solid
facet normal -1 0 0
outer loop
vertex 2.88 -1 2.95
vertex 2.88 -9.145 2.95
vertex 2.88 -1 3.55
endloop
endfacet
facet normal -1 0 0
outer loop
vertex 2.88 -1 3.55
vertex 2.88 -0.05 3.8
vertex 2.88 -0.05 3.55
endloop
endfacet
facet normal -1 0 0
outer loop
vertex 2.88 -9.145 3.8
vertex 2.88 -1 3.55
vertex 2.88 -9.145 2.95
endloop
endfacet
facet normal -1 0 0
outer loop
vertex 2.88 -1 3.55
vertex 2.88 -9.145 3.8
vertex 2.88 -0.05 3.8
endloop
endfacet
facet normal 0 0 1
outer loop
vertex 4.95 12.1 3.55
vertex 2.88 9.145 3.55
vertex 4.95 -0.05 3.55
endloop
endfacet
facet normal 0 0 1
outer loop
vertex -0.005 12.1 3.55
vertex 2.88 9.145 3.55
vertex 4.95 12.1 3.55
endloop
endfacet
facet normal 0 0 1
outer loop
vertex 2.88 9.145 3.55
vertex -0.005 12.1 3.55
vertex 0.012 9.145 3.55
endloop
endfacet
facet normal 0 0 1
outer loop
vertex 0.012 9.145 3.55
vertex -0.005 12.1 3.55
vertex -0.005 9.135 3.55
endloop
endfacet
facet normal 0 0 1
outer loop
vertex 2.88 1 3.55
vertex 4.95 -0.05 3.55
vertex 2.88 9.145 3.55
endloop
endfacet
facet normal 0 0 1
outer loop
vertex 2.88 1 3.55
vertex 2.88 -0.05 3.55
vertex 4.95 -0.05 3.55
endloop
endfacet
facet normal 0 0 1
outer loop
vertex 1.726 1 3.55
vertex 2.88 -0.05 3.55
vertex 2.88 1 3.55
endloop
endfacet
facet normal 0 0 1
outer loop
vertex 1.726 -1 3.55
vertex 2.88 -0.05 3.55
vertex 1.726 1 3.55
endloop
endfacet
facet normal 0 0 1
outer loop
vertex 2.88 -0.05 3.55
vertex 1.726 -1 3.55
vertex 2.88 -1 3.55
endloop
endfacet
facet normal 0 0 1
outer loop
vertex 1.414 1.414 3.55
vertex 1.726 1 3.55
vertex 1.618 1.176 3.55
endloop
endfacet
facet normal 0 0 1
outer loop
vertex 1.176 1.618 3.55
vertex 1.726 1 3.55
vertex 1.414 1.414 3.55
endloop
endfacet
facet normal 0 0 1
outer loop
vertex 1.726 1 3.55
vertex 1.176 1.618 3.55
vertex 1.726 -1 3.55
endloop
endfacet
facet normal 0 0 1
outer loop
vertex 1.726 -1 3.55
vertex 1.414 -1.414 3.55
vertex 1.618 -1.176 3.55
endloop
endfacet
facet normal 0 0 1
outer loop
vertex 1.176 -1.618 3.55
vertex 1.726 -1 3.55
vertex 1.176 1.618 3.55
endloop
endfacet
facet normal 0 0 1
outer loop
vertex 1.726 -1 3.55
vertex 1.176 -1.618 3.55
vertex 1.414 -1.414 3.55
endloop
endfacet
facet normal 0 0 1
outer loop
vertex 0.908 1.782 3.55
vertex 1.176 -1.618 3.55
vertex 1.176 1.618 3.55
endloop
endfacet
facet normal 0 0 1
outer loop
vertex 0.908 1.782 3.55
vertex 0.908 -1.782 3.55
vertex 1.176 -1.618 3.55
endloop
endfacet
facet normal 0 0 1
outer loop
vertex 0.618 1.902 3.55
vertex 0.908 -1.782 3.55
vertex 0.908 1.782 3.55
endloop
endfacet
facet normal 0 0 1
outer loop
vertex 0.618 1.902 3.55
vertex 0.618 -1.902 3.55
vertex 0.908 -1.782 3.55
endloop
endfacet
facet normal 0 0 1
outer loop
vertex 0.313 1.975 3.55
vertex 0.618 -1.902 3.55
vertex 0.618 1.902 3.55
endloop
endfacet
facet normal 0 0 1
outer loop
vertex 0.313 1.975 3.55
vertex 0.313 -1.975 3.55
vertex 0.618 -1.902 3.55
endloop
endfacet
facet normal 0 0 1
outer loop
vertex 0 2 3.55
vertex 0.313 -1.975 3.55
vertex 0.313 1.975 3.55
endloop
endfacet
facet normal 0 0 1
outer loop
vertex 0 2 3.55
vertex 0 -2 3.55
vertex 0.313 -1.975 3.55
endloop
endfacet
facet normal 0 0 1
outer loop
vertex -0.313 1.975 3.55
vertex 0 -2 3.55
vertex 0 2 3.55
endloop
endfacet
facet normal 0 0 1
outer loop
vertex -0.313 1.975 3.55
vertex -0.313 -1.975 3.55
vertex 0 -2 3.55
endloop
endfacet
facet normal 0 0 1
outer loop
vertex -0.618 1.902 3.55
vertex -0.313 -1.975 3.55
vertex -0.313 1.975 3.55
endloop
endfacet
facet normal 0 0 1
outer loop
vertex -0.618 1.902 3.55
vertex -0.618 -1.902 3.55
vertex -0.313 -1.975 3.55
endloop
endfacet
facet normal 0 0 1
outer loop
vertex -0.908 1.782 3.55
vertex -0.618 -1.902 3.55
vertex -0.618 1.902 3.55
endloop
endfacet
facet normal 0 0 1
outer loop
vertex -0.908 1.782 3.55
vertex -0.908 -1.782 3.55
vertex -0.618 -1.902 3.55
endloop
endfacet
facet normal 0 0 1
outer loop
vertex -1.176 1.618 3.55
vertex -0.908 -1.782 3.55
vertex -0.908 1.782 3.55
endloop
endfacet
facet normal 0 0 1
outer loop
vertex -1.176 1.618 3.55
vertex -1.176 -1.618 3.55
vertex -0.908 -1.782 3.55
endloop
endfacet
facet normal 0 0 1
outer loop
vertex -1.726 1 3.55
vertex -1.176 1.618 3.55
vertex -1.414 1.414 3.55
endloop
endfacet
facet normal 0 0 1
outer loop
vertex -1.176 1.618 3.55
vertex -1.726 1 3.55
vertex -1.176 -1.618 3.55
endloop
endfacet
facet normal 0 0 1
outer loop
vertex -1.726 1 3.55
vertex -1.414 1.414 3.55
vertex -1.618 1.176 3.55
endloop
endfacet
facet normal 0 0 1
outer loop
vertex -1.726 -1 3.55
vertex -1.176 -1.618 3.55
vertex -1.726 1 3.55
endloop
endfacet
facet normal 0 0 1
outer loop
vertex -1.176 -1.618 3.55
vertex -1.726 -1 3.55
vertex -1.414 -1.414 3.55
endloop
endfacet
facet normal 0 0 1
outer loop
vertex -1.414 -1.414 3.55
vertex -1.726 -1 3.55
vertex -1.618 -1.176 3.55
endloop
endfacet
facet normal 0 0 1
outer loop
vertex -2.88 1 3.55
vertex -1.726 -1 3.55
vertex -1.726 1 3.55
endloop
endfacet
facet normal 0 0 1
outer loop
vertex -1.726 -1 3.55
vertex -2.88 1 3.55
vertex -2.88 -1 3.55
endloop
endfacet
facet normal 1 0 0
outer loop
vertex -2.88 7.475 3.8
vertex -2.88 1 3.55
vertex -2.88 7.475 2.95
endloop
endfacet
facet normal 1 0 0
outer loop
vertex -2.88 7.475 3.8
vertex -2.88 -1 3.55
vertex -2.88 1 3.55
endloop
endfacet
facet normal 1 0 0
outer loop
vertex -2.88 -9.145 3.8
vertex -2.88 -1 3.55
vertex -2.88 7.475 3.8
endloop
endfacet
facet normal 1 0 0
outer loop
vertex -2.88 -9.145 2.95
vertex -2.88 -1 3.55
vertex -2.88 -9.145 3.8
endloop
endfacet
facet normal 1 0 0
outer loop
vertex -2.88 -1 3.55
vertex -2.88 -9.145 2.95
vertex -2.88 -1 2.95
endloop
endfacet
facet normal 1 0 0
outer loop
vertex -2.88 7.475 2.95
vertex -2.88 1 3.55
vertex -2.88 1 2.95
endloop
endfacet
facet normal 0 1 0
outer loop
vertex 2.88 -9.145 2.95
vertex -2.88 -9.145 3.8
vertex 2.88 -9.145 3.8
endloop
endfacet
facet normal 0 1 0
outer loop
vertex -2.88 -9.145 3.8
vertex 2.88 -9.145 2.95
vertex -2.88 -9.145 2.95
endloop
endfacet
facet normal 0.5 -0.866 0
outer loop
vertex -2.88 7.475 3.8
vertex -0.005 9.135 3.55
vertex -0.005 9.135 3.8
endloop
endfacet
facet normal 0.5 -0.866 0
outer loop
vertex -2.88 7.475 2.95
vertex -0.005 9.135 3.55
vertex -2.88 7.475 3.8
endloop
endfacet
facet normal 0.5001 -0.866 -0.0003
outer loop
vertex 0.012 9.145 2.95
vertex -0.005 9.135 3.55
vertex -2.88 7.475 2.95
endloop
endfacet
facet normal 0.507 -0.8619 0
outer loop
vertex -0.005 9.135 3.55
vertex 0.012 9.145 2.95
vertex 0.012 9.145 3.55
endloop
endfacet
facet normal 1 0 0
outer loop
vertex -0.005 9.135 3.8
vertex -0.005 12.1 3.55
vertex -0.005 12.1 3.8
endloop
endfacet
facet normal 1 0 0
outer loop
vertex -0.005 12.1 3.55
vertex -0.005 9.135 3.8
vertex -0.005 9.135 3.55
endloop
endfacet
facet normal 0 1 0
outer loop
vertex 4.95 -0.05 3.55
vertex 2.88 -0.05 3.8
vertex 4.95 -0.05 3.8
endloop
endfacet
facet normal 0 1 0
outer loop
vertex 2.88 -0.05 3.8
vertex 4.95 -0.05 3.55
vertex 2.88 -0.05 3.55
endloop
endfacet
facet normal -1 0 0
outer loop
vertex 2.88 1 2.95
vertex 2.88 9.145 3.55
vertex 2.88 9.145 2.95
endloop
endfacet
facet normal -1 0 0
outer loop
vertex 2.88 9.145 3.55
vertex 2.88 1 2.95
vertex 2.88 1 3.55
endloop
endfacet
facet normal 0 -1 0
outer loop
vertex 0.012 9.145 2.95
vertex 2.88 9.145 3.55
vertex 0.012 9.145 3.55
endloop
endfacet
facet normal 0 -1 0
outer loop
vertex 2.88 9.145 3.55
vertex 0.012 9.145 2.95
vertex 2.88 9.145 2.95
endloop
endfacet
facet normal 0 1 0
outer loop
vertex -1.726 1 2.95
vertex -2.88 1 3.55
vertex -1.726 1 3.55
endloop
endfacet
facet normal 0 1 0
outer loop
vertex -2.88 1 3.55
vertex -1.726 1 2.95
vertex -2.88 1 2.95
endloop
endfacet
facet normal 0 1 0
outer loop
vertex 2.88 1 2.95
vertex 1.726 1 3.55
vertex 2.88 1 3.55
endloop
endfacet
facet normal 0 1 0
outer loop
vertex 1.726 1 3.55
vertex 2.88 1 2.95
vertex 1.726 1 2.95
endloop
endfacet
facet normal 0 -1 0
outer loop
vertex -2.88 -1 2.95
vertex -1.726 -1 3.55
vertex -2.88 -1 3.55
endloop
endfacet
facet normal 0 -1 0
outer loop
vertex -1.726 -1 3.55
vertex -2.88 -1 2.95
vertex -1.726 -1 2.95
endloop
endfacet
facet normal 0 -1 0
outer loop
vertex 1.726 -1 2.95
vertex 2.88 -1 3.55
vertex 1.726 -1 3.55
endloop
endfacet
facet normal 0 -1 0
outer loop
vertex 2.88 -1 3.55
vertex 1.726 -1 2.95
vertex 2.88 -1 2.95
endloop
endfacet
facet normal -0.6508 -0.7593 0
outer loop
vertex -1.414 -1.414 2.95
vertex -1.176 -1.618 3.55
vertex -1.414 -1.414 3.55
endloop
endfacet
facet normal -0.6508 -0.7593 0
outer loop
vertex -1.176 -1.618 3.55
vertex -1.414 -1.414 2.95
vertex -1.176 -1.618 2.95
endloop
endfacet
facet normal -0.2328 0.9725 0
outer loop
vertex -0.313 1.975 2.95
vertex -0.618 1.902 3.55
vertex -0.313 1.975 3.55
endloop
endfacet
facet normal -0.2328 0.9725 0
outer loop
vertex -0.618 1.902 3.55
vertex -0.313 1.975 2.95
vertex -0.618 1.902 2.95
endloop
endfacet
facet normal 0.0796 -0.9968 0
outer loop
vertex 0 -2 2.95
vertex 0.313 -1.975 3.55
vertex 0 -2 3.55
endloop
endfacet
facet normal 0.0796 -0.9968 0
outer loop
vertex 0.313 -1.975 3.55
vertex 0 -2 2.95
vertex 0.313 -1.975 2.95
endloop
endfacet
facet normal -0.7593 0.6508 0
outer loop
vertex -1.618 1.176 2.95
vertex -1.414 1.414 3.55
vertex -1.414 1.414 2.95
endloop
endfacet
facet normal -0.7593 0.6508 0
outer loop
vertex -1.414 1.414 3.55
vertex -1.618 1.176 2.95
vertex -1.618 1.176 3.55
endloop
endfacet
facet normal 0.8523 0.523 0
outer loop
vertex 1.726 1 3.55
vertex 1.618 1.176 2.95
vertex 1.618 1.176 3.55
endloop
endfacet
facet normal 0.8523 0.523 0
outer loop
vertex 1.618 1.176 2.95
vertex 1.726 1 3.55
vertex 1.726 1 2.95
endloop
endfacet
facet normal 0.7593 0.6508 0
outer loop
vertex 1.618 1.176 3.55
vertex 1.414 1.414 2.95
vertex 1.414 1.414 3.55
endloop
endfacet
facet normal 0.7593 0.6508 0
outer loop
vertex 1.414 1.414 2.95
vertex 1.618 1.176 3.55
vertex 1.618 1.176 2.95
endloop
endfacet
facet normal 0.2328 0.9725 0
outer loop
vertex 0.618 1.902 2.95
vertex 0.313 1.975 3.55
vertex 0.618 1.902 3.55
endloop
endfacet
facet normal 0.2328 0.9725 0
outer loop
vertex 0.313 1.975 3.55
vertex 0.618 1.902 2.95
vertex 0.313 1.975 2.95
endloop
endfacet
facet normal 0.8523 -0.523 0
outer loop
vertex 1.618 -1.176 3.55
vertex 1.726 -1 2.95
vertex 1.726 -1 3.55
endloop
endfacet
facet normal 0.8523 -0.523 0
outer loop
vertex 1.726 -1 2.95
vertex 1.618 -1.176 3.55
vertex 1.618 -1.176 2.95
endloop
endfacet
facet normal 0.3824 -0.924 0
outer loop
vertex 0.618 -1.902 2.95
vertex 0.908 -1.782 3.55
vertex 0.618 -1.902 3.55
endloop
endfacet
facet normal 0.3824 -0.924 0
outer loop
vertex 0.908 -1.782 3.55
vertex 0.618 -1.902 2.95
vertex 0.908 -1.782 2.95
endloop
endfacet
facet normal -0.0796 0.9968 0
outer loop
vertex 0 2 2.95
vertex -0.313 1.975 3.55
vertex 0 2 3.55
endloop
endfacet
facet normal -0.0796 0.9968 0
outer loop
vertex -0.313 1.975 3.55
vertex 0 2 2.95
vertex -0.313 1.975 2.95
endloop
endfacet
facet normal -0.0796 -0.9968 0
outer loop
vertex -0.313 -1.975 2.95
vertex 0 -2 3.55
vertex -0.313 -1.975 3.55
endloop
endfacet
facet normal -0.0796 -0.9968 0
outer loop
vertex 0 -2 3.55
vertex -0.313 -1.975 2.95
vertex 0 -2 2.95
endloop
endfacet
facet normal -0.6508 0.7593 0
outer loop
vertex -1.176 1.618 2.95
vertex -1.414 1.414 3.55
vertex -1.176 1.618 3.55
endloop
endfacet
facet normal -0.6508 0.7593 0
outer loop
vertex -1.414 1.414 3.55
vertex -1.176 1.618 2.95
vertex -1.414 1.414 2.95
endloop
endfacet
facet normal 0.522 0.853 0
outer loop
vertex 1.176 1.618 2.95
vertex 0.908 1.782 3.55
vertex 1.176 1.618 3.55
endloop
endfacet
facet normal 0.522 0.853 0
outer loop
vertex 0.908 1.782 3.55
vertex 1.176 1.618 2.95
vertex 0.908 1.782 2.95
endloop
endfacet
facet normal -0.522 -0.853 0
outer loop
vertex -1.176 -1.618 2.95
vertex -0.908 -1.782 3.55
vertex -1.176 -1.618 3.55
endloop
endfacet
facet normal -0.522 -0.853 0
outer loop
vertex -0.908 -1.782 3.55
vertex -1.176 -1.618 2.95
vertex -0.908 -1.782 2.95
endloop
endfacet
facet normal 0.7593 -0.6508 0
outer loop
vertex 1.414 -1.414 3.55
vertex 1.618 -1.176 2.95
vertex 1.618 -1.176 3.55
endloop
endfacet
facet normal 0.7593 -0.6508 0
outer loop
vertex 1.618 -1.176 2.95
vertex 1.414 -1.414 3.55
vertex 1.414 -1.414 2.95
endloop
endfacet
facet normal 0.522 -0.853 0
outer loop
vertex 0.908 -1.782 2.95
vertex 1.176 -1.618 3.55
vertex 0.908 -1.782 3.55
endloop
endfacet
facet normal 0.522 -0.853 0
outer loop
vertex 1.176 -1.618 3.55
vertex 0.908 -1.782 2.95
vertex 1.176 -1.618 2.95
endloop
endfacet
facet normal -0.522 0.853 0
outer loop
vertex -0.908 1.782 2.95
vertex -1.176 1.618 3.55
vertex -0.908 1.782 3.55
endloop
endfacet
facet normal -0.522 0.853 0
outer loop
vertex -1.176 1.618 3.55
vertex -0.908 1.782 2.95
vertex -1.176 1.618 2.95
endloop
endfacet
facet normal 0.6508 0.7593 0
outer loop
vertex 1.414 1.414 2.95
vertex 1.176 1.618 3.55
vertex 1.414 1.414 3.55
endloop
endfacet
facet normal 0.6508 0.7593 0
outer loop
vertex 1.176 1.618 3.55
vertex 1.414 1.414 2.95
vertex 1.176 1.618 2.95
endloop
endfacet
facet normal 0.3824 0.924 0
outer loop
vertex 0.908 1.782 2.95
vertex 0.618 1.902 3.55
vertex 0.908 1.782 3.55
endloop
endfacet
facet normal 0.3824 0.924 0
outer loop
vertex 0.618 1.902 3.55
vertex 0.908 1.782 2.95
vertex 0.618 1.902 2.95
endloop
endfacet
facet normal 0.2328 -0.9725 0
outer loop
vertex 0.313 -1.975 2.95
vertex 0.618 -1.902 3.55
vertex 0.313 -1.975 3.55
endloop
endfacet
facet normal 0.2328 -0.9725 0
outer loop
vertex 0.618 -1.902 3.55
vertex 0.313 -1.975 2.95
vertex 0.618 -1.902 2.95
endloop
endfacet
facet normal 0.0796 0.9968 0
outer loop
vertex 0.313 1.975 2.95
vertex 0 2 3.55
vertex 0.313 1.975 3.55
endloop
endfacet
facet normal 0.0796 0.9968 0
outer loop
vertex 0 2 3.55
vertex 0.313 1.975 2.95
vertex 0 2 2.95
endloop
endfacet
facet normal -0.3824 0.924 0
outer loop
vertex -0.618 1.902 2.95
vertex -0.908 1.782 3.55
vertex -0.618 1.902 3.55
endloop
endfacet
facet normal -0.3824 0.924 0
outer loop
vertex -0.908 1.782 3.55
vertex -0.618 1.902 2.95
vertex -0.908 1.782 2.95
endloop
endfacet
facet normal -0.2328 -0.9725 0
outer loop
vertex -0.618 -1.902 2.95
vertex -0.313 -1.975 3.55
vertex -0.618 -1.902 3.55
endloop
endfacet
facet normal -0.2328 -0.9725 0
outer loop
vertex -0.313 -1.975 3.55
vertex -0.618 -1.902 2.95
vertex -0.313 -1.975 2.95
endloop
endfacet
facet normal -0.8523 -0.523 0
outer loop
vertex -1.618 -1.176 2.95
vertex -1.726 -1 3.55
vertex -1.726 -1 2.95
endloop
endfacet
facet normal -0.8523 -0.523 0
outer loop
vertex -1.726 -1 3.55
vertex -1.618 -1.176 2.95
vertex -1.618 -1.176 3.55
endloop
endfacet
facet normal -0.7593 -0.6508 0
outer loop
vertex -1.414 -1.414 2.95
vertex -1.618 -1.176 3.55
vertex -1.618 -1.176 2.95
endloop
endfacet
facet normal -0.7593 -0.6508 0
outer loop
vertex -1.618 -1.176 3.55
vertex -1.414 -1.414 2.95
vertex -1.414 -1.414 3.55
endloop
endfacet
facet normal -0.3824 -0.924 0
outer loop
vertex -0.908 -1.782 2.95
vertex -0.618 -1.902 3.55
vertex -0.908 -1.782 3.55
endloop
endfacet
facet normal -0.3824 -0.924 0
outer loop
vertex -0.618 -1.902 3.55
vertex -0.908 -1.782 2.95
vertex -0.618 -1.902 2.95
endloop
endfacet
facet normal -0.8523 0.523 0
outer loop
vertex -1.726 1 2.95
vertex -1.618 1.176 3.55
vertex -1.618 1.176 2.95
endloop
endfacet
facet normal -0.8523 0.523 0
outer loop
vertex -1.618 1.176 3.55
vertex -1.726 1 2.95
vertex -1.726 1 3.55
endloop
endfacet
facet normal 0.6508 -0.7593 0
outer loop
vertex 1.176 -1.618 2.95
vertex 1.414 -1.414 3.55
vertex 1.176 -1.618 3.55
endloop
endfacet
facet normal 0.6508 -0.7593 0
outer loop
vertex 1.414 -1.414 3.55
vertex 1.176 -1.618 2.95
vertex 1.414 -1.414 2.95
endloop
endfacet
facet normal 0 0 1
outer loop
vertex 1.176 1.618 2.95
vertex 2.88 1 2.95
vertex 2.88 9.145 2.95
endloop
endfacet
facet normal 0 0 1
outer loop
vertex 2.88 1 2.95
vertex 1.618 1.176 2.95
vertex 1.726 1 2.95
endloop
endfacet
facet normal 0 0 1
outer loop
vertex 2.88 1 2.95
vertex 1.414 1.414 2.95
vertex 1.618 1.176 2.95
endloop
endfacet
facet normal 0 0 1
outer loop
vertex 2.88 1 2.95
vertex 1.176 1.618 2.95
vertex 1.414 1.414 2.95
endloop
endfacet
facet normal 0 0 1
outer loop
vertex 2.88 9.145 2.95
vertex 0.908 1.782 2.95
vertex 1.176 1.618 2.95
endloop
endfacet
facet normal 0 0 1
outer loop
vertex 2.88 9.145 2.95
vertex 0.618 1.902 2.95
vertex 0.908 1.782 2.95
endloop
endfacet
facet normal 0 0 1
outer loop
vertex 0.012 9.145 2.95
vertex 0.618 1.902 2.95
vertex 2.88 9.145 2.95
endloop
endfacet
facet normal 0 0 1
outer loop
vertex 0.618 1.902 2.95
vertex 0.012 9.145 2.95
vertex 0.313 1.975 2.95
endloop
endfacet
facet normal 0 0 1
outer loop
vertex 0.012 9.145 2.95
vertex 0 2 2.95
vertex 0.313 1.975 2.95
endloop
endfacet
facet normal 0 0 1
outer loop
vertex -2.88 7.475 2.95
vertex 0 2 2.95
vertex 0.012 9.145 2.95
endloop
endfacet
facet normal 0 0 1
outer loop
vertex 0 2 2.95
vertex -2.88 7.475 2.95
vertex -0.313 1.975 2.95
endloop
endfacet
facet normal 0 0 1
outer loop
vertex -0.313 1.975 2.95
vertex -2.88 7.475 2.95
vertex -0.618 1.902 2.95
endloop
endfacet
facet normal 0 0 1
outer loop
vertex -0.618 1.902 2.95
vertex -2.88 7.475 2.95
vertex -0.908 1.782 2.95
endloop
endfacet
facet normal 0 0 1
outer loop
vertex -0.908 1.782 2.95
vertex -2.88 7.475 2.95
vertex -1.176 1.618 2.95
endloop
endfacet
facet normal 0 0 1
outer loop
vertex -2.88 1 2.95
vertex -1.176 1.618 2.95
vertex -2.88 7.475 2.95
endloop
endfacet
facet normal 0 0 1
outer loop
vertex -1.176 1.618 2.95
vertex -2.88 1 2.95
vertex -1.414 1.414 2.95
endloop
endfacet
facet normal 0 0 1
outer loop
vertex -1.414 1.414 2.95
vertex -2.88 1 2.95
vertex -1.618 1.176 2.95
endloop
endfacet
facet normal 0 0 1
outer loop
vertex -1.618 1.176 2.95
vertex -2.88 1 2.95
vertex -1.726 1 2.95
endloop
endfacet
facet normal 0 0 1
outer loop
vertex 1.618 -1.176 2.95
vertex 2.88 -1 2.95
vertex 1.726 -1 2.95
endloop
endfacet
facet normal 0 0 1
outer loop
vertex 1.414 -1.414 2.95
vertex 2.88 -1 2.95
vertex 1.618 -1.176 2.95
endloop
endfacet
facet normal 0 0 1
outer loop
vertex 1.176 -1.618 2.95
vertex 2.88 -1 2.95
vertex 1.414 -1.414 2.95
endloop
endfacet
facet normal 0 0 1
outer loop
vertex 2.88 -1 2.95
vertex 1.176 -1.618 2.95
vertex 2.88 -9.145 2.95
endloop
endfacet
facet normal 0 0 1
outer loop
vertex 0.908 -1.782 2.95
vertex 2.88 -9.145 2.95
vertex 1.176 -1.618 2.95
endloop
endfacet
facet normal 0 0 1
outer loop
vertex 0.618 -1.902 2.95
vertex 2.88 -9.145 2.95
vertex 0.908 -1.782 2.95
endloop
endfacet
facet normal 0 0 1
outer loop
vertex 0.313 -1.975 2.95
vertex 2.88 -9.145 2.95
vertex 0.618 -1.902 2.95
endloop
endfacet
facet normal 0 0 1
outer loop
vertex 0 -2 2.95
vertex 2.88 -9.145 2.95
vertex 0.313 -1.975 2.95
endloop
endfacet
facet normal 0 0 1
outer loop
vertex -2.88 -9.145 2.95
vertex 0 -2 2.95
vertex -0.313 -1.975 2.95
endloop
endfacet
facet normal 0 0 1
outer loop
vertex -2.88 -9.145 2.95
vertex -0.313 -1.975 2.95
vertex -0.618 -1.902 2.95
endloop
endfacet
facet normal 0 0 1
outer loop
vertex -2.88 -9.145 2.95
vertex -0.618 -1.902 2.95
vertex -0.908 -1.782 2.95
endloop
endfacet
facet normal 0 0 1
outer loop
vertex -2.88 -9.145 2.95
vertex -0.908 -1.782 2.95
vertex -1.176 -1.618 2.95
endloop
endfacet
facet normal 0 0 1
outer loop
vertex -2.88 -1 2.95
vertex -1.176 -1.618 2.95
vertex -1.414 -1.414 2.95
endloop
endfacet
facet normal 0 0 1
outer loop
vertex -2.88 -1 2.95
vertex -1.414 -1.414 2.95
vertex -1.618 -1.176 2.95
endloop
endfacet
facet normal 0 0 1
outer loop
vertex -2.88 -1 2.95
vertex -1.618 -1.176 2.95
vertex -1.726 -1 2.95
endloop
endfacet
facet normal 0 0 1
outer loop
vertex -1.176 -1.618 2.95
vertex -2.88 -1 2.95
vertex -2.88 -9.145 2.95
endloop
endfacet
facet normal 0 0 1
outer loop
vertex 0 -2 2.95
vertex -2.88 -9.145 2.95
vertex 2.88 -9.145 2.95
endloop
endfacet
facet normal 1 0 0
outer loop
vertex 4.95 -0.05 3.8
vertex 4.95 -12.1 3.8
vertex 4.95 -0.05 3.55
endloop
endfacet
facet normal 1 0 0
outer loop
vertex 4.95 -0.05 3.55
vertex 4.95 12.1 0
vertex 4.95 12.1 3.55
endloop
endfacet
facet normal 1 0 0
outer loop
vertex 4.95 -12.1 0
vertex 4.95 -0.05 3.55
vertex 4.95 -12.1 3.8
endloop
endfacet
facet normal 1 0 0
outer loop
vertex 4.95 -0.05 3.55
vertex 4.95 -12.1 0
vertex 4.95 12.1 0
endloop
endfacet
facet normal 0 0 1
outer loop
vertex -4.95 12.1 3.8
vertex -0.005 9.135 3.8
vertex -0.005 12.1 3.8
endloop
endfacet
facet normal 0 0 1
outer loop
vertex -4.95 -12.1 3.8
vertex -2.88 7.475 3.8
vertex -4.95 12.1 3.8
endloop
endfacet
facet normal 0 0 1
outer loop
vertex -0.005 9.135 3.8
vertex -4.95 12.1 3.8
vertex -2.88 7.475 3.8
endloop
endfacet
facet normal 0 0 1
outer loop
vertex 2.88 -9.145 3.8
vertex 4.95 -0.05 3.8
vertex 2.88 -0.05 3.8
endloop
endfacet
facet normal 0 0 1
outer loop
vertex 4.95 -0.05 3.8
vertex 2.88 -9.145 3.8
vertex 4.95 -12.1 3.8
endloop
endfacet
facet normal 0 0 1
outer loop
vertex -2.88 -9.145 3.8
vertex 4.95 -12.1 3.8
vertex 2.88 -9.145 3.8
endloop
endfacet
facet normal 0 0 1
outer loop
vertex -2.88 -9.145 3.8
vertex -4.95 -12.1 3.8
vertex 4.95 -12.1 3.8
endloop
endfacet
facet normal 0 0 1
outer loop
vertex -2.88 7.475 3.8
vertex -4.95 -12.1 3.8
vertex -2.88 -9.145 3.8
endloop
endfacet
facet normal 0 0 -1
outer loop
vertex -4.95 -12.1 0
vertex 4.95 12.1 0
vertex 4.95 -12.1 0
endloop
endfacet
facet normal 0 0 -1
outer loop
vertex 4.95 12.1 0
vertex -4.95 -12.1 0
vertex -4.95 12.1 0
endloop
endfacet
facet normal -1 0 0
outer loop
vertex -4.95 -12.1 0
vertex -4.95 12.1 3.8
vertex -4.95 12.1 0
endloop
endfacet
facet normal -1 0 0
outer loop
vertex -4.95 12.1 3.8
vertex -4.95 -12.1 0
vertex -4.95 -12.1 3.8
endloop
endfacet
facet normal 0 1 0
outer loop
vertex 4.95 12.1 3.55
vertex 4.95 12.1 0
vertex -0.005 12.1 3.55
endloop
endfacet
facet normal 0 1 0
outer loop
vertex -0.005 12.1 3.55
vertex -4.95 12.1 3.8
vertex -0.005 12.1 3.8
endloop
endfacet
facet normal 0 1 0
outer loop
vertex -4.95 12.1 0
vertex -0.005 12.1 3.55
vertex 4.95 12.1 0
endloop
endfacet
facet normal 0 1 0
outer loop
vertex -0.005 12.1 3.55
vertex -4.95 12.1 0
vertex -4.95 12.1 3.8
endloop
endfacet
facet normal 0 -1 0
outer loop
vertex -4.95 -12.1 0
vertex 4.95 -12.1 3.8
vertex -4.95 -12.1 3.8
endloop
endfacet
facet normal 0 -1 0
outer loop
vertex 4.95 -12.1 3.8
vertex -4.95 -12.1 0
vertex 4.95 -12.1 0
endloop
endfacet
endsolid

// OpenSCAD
/*
 * Creates the Antenova M2M M10382 GPS
 *
 * Author: Ian McInerney
 * Created: October 11, 2013
 */


module mainChip() {
	// Create the main chip outline
	translate([0.0,0.0,1.9]) {
		// The main chip body
		cube(size=[9.9,24.2,3.8], center=true);
	}
}

module mainCutout() {
	difference() {
		cube(size=[5.76,18.29,0.5], center=true);
		translate([-1.65,9.6,0]) rotate([0.0,0.0,30.0]) {
			cube(size=[5.0,2.45,1.0], center=true);
		}
	}
}

module antennaCutout() {
	mainCutout();
	translate([2.66,6.05,0]) {
		cube(size=[5.33,12.2,0.5], center=true);
	}
}

module chipCutout() {
	difference() {
		mainCutout();
		cube(size=[5.76,2.0,5.0], center=true);
		cylinder(h=5.0, r=2, center=true, $fn=40);
	}
}

difference() {
	mainChip();
	translate([0.0,0.0,3.8]) {antennaCutout();}
	translate([0.0,0.0,3.4]) {chipCutout();}
	translate([0.0,0.0,3.2]) {chipCutout();}
}
